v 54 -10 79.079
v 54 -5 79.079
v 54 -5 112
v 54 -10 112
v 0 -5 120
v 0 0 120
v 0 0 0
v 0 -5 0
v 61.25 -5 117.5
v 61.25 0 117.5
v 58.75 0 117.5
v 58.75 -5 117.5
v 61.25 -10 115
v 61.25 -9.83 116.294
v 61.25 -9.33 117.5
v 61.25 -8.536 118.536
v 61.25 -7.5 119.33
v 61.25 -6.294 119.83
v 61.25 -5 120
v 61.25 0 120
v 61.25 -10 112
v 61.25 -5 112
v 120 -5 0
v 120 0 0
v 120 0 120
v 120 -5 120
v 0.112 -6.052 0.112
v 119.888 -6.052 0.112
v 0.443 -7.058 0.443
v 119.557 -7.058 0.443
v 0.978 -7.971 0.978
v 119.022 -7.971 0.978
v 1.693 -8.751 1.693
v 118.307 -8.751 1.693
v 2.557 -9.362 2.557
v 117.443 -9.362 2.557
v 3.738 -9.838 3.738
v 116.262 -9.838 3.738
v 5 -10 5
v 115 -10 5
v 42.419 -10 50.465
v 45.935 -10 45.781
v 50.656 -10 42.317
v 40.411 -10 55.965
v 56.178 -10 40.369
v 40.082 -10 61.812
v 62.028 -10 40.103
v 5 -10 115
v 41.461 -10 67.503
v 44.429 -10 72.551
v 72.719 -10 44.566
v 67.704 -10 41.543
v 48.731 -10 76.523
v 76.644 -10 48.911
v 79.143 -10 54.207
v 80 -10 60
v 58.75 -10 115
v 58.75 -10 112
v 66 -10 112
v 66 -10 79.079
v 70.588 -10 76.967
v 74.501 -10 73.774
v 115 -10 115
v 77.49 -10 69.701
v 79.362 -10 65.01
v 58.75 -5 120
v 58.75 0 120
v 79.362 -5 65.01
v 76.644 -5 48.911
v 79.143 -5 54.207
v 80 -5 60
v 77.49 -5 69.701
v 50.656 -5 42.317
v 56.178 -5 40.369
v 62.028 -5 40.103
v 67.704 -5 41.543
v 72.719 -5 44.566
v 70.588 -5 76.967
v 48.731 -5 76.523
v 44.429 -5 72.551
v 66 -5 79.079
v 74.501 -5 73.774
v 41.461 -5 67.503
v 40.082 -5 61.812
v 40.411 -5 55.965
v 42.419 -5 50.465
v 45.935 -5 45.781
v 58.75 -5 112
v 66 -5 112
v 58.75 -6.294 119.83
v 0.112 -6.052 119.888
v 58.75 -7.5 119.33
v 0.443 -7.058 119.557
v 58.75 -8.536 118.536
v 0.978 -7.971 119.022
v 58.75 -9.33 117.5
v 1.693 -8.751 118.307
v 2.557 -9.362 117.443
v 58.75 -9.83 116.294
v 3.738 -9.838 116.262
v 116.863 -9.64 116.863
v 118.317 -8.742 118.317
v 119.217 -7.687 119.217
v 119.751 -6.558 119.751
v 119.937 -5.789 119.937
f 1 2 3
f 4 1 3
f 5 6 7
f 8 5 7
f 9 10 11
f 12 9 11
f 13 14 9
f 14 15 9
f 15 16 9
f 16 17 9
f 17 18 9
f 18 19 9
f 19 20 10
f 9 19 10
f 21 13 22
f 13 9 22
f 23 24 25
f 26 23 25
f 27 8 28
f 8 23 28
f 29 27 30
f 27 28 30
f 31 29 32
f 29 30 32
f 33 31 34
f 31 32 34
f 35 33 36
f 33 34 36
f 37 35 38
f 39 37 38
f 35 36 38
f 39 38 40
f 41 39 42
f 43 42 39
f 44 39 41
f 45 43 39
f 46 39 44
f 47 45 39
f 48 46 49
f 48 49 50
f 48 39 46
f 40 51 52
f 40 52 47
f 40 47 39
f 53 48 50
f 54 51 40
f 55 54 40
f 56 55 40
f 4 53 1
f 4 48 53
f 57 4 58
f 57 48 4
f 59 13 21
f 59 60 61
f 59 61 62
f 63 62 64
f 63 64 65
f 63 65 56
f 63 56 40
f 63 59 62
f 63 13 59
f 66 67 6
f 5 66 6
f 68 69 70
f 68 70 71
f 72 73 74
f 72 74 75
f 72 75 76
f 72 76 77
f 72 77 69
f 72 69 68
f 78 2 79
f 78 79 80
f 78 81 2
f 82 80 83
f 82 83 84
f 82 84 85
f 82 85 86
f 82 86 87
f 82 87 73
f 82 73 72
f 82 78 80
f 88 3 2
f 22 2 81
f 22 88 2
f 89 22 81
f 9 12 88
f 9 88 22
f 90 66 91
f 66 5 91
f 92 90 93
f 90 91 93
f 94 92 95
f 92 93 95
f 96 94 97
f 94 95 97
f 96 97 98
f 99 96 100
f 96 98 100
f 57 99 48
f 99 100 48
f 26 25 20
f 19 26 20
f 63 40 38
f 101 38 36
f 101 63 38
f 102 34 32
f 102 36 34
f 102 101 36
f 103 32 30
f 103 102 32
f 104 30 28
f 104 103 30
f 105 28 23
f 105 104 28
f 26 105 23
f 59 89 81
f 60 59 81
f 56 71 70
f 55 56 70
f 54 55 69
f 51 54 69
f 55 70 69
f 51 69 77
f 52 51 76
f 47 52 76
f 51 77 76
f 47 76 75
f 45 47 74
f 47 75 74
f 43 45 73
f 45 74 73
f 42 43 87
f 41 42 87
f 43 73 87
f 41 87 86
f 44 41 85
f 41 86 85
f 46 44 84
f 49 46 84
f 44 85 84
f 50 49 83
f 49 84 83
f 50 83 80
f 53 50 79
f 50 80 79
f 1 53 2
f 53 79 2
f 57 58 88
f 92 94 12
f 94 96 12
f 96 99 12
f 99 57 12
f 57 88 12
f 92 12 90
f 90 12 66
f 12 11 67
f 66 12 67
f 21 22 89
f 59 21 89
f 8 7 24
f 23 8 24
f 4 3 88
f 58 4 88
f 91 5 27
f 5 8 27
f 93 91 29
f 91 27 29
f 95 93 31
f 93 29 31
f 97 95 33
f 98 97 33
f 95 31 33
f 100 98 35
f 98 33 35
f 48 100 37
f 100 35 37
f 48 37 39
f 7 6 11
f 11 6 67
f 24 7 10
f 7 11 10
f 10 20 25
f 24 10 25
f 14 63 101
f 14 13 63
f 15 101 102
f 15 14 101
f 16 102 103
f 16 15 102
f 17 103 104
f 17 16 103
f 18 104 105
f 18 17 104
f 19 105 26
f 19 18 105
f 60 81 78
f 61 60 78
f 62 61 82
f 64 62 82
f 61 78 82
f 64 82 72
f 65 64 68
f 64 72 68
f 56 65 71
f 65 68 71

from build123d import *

# Parameters (mm, degrees)
F1_DEPTH = 5
F2_DEPTH = 10
F3_R     = 5


with BuildPart() as f1:
    # F0 (on Front) → F1 (new body)
    with BuildSketch(Plane.XZ):
        with BuildLine():
            Line((54, 60), (54, 79.078784))
            ThreePointArc((54, 79.078784), (48.16784, 43.875485), (80, 60))
            ThreePointArc((80, 60), (76.124515, 71.83216), (66, 79.078784))
            Line((66, 79.078784), (66, 60))
            Line((66, 60), (60, 60))
            Line((60, 60), (54, 60))
        make_face()
        with BuildLine():
            ThreePointArc((60, 80), (56.964846, 79.768355), (54, 79.078784))
            Line((54, 79.078784), (54, 60))
            Line((54, 60), (60, 60))
            Line((60, 60), (66, 60))
            Line((66, 60), (66, 79.078784))
            ThreePointArc((66, 79.078784), (63.035154, 79.768355), (60, 80))
        make_face()
        with BuildLine():
            Line((60, 80), (54, 80))
            Line((54, 80), (54, 79.078784))
            ThreePointArc((54, 79.078784), (56.964846, 79.768355), (60, 80))
        make_face()
        with BuildLine():
            Line((66, 79.078784), (66, 80))
            Line((66, 80), (60, 80))
            ThreePointArc((60, 80), (63.035154, 79.768355), (66, 79.078784))
        make_face()
        Polygon((58.75, 112), (54, 112), (54, 80), (60, 80), (66, 80), (66, 112), (61.25, 112), (61.25, 117.5), (58.75, 117.5), align=None)
    extrude(amount=F1_DEPTH)

    # F0 (on Front) → F2 (join)
    with BuildSketch(Plane.XZ):
        with BuildLine():
            Line((0, 120), (0, 0))
            Line((0, 0), (120, 0))
            Line((120, 0), (120, 120))
            Line((120, 120), (66, 120))
            Line((66, 120), (66, 112))
            Line((66, 112), (66, 80))
            Line((66, 80), (66, 79.078784))
            ThreePointArc((66, 79.078784), (76.124515, 71.83216), (80, 60))
            ThreePointArc((80, 60), (48.16784, 43.875485), (54, 79.078784))
            Line((54, 79.078784), (54, 80))
            Line((54, 80), (54, 112))
            Line((54, 112), (54, 120))
            Line((54, 120), (0, 120))
        make_face()
        Polygon((58.75, 120), (54, 120), (54, 112), (58.75, 112), (58.75, 117.5), align=None)
        Polygon((66, 112), (66, 120), (61.25, 120), (61.25, 117.5), (61.25, 112), align=None)
    extrude(amount=F2_DEPTH)

    # F3
    f3_edges = [f1.edges().sort_by_distance(p)[0] for p in [
        (0, -10, 60),
        (60, -10, 0),
        (120, -10, 60),
        (90.625, -10, 120),
        (29.375, -10, 120),
    ]]
    fillet(f3_edges, radius=F3_R)


solid = f1.part
